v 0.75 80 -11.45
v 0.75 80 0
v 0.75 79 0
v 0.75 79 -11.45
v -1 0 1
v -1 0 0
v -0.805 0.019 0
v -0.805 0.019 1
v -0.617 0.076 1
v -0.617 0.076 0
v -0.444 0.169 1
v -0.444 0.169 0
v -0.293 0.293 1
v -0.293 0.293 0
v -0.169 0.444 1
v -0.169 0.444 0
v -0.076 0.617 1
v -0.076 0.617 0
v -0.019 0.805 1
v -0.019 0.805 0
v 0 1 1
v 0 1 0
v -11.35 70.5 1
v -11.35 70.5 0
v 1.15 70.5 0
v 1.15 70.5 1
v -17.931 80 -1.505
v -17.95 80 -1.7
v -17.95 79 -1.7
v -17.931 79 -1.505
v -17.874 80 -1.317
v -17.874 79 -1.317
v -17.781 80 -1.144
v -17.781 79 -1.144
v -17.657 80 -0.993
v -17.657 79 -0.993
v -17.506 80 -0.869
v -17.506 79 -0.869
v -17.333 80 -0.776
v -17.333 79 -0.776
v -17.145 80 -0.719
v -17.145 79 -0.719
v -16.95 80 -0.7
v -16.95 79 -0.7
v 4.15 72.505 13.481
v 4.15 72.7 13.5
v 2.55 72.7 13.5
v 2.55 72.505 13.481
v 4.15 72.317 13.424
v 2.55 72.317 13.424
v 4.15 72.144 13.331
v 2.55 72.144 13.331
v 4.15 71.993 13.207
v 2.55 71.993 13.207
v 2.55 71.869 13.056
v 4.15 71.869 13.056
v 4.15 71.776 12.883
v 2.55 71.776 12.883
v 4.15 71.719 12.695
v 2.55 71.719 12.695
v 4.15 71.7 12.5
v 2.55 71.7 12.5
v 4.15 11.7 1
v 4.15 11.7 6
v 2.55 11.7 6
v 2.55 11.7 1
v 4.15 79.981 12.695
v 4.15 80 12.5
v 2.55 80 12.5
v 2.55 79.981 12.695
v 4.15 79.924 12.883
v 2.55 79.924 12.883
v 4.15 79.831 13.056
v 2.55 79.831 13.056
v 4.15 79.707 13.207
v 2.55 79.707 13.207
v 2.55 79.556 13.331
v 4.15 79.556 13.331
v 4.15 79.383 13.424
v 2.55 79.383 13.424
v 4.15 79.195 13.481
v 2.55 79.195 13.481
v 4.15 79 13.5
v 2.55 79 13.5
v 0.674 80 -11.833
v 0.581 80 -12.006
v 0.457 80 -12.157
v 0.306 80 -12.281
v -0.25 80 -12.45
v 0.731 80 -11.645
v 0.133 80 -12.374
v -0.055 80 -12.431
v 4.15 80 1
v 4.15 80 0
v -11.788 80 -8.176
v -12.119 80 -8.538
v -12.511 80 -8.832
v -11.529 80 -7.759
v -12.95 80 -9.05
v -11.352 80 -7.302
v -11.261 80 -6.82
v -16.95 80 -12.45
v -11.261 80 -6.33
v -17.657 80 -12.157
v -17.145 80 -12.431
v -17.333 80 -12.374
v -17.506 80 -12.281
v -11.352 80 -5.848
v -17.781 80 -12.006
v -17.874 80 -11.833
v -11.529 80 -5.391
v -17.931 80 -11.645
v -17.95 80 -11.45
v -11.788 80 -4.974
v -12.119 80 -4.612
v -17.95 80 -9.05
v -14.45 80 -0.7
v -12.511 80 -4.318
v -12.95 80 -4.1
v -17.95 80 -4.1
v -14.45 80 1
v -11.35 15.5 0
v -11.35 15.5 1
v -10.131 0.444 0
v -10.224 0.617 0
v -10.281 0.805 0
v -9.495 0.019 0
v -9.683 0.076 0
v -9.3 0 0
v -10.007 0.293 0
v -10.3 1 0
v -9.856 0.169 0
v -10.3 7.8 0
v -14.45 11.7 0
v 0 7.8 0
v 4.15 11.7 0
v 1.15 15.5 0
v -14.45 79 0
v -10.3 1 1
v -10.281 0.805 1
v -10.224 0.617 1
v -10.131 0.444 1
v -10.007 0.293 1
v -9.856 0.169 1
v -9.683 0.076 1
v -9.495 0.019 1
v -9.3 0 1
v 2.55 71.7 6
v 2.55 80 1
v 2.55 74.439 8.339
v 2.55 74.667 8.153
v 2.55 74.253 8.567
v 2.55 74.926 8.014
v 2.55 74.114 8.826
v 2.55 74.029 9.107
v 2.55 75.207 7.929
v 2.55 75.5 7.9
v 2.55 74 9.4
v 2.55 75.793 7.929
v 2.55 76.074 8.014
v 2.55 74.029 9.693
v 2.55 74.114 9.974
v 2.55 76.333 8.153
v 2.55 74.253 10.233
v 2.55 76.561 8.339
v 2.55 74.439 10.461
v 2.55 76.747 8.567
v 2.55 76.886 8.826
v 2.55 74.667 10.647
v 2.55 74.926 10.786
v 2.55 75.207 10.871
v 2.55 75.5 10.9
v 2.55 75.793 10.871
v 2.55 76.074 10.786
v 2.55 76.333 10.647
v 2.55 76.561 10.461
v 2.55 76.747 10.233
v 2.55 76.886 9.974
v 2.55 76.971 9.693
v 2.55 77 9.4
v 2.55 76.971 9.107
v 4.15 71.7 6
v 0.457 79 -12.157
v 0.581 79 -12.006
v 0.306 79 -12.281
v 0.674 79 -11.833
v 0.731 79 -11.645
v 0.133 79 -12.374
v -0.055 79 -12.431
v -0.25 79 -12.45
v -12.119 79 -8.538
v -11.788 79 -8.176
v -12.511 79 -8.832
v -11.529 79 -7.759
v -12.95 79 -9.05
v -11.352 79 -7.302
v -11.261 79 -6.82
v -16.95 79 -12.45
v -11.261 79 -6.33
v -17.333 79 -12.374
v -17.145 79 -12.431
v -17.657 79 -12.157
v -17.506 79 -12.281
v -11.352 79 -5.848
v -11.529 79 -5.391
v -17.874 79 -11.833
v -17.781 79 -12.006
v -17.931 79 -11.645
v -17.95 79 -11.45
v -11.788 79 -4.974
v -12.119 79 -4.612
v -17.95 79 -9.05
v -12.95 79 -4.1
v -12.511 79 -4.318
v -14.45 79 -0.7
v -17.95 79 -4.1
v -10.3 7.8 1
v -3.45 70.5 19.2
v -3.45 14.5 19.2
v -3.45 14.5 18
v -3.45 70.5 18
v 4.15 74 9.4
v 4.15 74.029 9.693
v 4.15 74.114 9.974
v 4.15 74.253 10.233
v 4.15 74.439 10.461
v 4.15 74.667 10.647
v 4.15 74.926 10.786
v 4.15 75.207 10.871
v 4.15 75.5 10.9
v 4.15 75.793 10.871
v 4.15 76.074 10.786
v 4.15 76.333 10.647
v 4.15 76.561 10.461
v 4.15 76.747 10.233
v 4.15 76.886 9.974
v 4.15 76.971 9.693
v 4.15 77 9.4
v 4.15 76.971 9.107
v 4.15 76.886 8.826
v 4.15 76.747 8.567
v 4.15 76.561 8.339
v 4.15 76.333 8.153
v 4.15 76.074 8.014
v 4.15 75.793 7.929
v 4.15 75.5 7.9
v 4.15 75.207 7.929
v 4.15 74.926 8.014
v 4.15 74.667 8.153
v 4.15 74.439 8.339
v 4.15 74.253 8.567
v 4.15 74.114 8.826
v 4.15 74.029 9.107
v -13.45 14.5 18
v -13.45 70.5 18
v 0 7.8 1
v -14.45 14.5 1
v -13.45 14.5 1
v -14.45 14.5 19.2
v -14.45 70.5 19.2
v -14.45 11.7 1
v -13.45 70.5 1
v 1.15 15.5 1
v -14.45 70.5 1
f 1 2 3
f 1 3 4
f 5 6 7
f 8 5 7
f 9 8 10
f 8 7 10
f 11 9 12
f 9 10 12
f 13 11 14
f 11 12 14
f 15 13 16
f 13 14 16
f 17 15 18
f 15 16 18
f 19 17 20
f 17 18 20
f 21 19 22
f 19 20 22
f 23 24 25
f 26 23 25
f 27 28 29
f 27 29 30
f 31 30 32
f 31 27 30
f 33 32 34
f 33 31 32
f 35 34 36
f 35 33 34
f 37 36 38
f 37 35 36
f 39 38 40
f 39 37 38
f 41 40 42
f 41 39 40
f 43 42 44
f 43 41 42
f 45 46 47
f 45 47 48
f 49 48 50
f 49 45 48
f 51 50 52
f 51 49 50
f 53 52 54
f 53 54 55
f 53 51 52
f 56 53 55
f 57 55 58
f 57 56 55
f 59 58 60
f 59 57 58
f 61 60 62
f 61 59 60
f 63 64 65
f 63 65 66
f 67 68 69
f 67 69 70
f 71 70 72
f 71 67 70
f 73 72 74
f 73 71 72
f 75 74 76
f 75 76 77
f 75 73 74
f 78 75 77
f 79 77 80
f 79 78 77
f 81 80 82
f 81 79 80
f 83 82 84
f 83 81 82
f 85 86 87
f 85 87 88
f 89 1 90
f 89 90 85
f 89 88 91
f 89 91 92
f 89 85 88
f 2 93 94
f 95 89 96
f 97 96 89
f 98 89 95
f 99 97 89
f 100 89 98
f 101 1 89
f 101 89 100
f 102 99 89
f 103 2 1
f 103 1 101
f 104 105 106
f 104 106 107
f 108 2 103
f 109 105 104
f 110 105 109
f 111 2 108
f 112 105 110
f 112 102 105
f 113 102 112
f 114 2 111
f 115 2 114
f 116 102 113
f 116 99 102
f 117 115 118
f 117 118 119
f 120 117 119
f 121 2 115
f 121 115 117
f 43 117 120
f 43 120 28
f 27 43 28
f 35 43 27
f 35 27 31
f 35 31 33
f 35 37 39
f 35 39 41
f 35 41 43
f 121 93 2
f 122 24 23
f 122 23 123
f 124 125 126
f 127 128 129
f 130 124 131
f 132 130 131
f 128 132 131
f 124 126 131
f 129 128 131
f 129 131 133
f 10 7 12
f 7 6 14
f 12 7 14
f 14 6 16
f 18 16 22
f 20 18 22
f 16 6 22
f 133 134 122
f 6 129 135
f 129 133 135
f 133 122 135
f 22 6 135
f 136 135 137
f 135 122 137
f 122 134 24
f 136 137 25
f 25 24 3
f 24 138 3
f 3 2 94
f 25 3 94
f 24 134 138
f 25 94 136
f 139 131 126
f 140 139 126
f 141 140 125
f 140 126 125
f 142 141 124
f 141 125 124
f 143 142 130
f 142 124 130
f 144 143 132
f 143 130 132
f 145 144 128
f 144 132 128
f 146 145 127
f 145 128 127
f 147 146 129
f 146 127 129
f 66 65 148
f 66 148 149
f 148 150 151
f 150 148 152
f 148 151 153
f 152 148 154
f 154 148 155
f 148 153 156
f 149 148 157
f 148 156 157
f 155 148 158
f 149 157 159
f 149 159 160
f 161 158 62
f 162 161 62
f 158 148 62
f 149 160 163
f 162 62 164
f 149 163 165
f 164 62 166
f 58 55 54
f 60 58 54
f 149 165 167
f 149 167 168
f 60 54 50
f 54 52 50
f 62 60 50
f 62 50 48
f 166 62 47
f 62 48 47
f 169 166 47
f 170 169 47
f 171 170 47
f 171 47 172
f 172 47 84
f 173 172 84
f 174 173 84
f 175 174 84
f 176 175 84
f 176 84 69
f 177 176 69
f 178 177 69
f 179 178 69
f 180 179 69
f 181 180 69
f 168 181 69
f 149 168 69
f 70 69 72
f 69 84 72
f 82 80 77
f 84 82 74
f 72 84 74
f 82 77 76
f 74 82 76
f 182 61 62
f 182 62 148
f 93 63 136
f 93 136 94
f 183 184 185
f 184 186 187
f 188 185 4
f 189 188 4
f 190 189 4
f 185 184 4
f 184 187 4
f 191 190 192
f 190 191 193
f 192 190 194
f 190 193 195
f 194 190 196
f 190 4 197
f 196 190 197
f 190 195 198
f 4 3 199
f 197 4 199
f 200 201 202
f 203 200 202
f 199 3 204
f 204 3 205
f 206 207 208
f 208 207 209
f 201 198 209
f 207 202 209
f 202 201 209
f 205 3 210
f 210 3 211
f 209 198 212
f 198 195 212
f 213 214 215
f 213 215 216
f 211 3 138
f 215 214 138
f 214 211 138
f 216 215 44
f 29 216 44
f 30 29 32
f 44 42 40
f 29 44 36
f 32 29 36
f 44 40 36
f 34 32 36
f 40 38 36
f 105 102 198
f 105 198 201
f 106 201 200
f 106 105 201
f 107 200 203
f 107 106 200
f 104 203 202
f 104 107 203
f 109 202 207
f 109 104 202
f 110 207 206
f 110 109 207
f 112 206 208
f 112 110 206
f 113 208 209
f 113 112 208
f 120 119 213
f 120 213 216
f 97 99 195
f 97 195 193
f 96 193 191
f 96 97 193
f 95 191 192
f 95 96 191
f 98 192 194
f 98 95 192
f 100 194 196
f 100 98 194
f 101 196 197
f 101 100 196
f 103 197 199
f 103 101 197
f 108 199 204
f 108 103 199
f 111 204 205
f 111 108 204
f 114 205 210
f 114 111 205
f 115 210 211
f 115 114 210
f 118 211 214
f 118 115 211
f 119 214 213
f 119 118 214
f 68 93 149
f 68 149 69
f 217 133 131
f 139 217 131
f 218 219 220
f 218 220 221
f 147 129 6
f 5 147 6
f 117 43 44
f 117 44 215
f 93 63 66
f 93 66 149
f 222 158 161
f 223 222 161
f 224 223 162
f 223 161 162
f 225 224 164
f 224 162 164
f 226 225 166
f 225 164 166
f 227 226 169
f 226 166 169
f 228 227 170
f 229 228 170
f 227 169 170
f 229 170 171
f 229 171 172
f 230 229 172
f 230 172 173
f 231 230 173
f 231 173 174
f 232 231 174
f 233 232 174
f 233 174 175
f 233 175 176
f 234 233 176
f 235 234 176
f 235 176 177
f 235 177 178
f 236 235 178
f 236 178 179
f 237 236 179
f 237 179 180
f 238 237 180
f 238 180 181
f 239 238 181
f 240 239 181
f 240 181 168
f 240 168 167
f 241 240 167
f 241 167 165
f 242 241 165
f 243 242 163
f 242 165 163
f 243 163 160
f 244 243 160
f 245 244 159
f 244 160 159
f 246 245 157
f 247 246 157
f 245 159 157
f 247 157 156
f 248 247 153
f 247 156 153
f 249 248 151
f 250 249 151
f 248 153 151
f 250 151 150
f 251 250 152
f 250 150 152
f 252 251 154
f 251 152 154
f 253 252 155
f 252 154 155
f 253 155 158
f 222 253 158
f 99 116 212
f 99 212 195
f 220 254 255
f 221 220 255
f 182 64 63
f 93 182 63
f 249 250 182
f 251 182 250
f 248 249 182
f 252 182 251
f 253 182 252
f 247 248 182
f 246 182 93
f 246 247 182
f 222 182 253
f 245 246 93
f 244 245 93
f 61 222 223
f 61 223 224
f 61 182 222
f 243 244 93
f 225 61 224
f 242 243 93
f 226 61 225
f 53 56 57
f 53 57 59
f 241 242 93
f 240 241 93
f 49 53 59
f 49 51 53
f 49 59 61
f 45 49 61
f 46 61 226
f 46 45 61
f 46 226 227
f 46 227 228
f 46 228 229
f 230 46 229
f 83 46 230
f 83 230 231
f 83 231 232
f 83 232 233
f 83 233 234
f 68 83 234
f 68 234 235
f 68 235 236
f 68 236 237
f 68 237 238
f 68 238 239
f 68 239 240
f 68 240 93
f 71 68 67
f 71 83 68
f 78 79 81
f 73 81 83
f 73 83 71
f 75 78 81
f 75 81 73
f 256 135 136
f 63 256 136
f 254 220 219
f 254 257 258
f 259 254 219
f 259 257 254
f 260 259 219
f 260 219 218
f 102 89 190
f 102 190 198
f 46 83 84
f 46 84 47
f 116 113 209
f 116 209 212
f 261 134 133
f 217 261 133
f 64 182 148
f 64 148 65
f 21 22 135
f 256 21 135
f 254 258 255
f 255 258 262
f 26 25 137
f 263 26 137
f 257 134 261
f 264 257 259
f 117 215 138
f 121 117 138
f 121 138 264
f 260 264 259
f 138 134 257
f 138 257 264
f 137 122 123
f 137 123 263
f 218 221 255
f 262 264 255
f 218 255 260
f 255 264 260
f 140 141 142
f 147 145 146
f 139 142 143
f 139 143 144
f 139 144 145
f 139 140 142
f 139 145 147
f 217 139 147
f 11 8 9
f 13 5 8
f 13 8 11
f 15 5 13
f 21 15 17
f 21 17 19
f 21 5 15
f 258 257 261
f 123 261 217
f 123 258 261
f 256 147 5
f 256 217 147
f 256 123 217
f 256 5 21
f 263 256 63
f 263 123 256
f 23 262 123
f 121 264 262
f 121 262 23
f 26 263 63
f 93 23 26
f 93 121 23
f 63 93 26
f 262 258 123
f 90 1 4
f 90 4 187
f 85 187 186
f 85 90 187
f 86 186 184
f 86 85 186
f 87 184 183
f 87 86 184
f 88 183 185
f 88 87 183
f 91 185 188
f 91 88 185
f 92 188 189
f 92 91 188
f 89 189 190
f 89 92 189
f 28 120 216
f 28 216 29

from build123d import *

# Parameters (mm, degrees)
F1_DEPTH  = 1
F2_R      = 1.15
F3_DEPTH  = 1
F4_W      = 12.5
F4_H      = 55
F5_DEPTH  = 1
F7_DEPTH  = 1
F9_DEPTH  = 1.6
F10_W     = 1
F10_H     = 56
F11_DEPTH = 18.2
F12_D     = 3
F13_W     = 56
F13_H     = 1.2
F14_DEPTH = 10


with BuildPart() as f1:
    # F0 (on Top) → F1 (new body)
    with BuildSketch(Plane.XY):
        with BuildLine():
            Line((-9.3, 0), (-1, 0))
            ThreePointArc((-1, 0), (-0.2928932188, 0.2928932188), (0, 1))
            Line((0, 1), (0, 7.8))
            Line((0, 7.8), (4.15, 11.7))
            Line((4.15, 11.7), (4.15, 73.4))
            Line((4.15, 73.4), (0.75, 76.5))
            Line((0.75, 76.5), (0.75, 80))
            Line((0.75, 80), (-14.45, 80))
            Line((-14.45, 80), (-14.45, 73.4))
            Line((-14.45, 73.4), (-14.45, 11.7))
            Line((-14.45, 11.7), (-10.3, 7.8))
            Line((-10.3, 7.8), (-10.3, 1))
            ThreePointArc((-10.3, 1), (-10.0071067812, 0.2928932188), (-9.3, 0))
        make_face()
    extrude(amount=F1_DEPTH)

    # F2 (on face) → F3 (join)
    with BuildSketch(Plane(origin=(0, 80, 0), x_dir=(-1, 0, 0), z_dir=(0, 1, 0))):
        with BuildLine():
            Line((14.45, -0.7), (14.45, 0))
            Line((14.45, 0), (-0.75, 0))
            Line((-0.75, 0), (-0.75, -11.45))
            ThreePointArc((-0.75, -11.45), (-0.4571067812, -12.1571067812), (0.25, -12.45))
            Line((0.25, -12.45), (16.95, -12.45))
            ThreePointArc((16.95, -12.45), (17.6571067812, -12.1571067812), (17.95, -11.45))
            Line((17.95, -11.45), (17.95, -9.05))
            Line((17.95, -9.05), (12.95, -9.05))
            ThreePointArc((12.95, -9.05), (11.25, -6.575), (12.95, -4.1))
            Line((12.95, -4.1), (17.95, -4.1))
            Line((17.95, -4.1), (17.95, -1.7))
            ThreePointArc((17.95, -1.7), (17.6571067812, -0.9928932188), (16.95, -0.7))
            Line((16.95, -0.7), (14.45, -0.7))
        make_face()
        with Locations((2.45, -9.25)):
            Circle(F2_R, mode=Mode.SUBTRACT)
        with Locations((2.45, -9.25)):
            Circle(F2_R)
    extrude(amount=-F3_DEPTH)

    # F4 (on face) → F5 (cut)
    with BuildSketch(Plane(origin=(0, 0, 0), x_dir=(1, 0, 0), z_dir=(0, 0, -1))):
        with Locations((-5.1, -43)):
            Rectangle(F4_W, F4_H)
    extrude(amount=-F5_DEPTH, mode=Mode.SUBTRACT)

    # F6 (on face) → F7 (join)
    with BuildSketch(Plane.XY.offset(1)):
        Polygon((0.75, 76.5), (4.15, 73.4), (4.15, 80), (0.75, 80), align=None)
    extrude(amount=-F7_DEPTH)

    # F10 (on face) → F11 (join)
    with BuildSketch(Plane.XY.offset(1)):
        with Locations((-13.95, 42.5)):
            Rectangle(F10_W, F10_H)
    extrude(amount=F11_DEPTH)

    # F13 (on face) → F14 (join)
    with BuildSketch(Plane.YZ.offset(-13.45)):
        with Locations((42.5, 18.6)):
            Rectangle(F13_W, F13_H)
    extrude(amount=F14_DEPTH)


with BuildPart() as f9:
    # F8 (on face) → F9 (new body)
    with BuildSketch(Plane.YZ.offset(4.15)):
        with BuildLine():
            Line((11.7, 1), (80, 1))
            Line((80, 1), (80, 12.5))
            ThreePointArc((80, 12.5), (79.7071067812, 13.2071067812), (79, 13.5))
            Line((79, 13.5), (72.7, 13.5))
            ThreePointArc((72.7, 13.5), (71.9928932188, 13.2071067812), (71.7, 12.5))
            Line((71.7, 12.5), (71.7, 6))
            Line((71.7, 6), (11.7, 6))
            Line((11.7, 6), (11.7, 1))
        make_face()
    extrude(amount=-F9_DEPTH)

    # F12 (through all)
    with Locations(Plane.YZ.offset(4.15)):
        with Locations((75.5, 9.4)):
            Hole(F12_D / 2)


solid = Compound([f1.part, f9.part])
